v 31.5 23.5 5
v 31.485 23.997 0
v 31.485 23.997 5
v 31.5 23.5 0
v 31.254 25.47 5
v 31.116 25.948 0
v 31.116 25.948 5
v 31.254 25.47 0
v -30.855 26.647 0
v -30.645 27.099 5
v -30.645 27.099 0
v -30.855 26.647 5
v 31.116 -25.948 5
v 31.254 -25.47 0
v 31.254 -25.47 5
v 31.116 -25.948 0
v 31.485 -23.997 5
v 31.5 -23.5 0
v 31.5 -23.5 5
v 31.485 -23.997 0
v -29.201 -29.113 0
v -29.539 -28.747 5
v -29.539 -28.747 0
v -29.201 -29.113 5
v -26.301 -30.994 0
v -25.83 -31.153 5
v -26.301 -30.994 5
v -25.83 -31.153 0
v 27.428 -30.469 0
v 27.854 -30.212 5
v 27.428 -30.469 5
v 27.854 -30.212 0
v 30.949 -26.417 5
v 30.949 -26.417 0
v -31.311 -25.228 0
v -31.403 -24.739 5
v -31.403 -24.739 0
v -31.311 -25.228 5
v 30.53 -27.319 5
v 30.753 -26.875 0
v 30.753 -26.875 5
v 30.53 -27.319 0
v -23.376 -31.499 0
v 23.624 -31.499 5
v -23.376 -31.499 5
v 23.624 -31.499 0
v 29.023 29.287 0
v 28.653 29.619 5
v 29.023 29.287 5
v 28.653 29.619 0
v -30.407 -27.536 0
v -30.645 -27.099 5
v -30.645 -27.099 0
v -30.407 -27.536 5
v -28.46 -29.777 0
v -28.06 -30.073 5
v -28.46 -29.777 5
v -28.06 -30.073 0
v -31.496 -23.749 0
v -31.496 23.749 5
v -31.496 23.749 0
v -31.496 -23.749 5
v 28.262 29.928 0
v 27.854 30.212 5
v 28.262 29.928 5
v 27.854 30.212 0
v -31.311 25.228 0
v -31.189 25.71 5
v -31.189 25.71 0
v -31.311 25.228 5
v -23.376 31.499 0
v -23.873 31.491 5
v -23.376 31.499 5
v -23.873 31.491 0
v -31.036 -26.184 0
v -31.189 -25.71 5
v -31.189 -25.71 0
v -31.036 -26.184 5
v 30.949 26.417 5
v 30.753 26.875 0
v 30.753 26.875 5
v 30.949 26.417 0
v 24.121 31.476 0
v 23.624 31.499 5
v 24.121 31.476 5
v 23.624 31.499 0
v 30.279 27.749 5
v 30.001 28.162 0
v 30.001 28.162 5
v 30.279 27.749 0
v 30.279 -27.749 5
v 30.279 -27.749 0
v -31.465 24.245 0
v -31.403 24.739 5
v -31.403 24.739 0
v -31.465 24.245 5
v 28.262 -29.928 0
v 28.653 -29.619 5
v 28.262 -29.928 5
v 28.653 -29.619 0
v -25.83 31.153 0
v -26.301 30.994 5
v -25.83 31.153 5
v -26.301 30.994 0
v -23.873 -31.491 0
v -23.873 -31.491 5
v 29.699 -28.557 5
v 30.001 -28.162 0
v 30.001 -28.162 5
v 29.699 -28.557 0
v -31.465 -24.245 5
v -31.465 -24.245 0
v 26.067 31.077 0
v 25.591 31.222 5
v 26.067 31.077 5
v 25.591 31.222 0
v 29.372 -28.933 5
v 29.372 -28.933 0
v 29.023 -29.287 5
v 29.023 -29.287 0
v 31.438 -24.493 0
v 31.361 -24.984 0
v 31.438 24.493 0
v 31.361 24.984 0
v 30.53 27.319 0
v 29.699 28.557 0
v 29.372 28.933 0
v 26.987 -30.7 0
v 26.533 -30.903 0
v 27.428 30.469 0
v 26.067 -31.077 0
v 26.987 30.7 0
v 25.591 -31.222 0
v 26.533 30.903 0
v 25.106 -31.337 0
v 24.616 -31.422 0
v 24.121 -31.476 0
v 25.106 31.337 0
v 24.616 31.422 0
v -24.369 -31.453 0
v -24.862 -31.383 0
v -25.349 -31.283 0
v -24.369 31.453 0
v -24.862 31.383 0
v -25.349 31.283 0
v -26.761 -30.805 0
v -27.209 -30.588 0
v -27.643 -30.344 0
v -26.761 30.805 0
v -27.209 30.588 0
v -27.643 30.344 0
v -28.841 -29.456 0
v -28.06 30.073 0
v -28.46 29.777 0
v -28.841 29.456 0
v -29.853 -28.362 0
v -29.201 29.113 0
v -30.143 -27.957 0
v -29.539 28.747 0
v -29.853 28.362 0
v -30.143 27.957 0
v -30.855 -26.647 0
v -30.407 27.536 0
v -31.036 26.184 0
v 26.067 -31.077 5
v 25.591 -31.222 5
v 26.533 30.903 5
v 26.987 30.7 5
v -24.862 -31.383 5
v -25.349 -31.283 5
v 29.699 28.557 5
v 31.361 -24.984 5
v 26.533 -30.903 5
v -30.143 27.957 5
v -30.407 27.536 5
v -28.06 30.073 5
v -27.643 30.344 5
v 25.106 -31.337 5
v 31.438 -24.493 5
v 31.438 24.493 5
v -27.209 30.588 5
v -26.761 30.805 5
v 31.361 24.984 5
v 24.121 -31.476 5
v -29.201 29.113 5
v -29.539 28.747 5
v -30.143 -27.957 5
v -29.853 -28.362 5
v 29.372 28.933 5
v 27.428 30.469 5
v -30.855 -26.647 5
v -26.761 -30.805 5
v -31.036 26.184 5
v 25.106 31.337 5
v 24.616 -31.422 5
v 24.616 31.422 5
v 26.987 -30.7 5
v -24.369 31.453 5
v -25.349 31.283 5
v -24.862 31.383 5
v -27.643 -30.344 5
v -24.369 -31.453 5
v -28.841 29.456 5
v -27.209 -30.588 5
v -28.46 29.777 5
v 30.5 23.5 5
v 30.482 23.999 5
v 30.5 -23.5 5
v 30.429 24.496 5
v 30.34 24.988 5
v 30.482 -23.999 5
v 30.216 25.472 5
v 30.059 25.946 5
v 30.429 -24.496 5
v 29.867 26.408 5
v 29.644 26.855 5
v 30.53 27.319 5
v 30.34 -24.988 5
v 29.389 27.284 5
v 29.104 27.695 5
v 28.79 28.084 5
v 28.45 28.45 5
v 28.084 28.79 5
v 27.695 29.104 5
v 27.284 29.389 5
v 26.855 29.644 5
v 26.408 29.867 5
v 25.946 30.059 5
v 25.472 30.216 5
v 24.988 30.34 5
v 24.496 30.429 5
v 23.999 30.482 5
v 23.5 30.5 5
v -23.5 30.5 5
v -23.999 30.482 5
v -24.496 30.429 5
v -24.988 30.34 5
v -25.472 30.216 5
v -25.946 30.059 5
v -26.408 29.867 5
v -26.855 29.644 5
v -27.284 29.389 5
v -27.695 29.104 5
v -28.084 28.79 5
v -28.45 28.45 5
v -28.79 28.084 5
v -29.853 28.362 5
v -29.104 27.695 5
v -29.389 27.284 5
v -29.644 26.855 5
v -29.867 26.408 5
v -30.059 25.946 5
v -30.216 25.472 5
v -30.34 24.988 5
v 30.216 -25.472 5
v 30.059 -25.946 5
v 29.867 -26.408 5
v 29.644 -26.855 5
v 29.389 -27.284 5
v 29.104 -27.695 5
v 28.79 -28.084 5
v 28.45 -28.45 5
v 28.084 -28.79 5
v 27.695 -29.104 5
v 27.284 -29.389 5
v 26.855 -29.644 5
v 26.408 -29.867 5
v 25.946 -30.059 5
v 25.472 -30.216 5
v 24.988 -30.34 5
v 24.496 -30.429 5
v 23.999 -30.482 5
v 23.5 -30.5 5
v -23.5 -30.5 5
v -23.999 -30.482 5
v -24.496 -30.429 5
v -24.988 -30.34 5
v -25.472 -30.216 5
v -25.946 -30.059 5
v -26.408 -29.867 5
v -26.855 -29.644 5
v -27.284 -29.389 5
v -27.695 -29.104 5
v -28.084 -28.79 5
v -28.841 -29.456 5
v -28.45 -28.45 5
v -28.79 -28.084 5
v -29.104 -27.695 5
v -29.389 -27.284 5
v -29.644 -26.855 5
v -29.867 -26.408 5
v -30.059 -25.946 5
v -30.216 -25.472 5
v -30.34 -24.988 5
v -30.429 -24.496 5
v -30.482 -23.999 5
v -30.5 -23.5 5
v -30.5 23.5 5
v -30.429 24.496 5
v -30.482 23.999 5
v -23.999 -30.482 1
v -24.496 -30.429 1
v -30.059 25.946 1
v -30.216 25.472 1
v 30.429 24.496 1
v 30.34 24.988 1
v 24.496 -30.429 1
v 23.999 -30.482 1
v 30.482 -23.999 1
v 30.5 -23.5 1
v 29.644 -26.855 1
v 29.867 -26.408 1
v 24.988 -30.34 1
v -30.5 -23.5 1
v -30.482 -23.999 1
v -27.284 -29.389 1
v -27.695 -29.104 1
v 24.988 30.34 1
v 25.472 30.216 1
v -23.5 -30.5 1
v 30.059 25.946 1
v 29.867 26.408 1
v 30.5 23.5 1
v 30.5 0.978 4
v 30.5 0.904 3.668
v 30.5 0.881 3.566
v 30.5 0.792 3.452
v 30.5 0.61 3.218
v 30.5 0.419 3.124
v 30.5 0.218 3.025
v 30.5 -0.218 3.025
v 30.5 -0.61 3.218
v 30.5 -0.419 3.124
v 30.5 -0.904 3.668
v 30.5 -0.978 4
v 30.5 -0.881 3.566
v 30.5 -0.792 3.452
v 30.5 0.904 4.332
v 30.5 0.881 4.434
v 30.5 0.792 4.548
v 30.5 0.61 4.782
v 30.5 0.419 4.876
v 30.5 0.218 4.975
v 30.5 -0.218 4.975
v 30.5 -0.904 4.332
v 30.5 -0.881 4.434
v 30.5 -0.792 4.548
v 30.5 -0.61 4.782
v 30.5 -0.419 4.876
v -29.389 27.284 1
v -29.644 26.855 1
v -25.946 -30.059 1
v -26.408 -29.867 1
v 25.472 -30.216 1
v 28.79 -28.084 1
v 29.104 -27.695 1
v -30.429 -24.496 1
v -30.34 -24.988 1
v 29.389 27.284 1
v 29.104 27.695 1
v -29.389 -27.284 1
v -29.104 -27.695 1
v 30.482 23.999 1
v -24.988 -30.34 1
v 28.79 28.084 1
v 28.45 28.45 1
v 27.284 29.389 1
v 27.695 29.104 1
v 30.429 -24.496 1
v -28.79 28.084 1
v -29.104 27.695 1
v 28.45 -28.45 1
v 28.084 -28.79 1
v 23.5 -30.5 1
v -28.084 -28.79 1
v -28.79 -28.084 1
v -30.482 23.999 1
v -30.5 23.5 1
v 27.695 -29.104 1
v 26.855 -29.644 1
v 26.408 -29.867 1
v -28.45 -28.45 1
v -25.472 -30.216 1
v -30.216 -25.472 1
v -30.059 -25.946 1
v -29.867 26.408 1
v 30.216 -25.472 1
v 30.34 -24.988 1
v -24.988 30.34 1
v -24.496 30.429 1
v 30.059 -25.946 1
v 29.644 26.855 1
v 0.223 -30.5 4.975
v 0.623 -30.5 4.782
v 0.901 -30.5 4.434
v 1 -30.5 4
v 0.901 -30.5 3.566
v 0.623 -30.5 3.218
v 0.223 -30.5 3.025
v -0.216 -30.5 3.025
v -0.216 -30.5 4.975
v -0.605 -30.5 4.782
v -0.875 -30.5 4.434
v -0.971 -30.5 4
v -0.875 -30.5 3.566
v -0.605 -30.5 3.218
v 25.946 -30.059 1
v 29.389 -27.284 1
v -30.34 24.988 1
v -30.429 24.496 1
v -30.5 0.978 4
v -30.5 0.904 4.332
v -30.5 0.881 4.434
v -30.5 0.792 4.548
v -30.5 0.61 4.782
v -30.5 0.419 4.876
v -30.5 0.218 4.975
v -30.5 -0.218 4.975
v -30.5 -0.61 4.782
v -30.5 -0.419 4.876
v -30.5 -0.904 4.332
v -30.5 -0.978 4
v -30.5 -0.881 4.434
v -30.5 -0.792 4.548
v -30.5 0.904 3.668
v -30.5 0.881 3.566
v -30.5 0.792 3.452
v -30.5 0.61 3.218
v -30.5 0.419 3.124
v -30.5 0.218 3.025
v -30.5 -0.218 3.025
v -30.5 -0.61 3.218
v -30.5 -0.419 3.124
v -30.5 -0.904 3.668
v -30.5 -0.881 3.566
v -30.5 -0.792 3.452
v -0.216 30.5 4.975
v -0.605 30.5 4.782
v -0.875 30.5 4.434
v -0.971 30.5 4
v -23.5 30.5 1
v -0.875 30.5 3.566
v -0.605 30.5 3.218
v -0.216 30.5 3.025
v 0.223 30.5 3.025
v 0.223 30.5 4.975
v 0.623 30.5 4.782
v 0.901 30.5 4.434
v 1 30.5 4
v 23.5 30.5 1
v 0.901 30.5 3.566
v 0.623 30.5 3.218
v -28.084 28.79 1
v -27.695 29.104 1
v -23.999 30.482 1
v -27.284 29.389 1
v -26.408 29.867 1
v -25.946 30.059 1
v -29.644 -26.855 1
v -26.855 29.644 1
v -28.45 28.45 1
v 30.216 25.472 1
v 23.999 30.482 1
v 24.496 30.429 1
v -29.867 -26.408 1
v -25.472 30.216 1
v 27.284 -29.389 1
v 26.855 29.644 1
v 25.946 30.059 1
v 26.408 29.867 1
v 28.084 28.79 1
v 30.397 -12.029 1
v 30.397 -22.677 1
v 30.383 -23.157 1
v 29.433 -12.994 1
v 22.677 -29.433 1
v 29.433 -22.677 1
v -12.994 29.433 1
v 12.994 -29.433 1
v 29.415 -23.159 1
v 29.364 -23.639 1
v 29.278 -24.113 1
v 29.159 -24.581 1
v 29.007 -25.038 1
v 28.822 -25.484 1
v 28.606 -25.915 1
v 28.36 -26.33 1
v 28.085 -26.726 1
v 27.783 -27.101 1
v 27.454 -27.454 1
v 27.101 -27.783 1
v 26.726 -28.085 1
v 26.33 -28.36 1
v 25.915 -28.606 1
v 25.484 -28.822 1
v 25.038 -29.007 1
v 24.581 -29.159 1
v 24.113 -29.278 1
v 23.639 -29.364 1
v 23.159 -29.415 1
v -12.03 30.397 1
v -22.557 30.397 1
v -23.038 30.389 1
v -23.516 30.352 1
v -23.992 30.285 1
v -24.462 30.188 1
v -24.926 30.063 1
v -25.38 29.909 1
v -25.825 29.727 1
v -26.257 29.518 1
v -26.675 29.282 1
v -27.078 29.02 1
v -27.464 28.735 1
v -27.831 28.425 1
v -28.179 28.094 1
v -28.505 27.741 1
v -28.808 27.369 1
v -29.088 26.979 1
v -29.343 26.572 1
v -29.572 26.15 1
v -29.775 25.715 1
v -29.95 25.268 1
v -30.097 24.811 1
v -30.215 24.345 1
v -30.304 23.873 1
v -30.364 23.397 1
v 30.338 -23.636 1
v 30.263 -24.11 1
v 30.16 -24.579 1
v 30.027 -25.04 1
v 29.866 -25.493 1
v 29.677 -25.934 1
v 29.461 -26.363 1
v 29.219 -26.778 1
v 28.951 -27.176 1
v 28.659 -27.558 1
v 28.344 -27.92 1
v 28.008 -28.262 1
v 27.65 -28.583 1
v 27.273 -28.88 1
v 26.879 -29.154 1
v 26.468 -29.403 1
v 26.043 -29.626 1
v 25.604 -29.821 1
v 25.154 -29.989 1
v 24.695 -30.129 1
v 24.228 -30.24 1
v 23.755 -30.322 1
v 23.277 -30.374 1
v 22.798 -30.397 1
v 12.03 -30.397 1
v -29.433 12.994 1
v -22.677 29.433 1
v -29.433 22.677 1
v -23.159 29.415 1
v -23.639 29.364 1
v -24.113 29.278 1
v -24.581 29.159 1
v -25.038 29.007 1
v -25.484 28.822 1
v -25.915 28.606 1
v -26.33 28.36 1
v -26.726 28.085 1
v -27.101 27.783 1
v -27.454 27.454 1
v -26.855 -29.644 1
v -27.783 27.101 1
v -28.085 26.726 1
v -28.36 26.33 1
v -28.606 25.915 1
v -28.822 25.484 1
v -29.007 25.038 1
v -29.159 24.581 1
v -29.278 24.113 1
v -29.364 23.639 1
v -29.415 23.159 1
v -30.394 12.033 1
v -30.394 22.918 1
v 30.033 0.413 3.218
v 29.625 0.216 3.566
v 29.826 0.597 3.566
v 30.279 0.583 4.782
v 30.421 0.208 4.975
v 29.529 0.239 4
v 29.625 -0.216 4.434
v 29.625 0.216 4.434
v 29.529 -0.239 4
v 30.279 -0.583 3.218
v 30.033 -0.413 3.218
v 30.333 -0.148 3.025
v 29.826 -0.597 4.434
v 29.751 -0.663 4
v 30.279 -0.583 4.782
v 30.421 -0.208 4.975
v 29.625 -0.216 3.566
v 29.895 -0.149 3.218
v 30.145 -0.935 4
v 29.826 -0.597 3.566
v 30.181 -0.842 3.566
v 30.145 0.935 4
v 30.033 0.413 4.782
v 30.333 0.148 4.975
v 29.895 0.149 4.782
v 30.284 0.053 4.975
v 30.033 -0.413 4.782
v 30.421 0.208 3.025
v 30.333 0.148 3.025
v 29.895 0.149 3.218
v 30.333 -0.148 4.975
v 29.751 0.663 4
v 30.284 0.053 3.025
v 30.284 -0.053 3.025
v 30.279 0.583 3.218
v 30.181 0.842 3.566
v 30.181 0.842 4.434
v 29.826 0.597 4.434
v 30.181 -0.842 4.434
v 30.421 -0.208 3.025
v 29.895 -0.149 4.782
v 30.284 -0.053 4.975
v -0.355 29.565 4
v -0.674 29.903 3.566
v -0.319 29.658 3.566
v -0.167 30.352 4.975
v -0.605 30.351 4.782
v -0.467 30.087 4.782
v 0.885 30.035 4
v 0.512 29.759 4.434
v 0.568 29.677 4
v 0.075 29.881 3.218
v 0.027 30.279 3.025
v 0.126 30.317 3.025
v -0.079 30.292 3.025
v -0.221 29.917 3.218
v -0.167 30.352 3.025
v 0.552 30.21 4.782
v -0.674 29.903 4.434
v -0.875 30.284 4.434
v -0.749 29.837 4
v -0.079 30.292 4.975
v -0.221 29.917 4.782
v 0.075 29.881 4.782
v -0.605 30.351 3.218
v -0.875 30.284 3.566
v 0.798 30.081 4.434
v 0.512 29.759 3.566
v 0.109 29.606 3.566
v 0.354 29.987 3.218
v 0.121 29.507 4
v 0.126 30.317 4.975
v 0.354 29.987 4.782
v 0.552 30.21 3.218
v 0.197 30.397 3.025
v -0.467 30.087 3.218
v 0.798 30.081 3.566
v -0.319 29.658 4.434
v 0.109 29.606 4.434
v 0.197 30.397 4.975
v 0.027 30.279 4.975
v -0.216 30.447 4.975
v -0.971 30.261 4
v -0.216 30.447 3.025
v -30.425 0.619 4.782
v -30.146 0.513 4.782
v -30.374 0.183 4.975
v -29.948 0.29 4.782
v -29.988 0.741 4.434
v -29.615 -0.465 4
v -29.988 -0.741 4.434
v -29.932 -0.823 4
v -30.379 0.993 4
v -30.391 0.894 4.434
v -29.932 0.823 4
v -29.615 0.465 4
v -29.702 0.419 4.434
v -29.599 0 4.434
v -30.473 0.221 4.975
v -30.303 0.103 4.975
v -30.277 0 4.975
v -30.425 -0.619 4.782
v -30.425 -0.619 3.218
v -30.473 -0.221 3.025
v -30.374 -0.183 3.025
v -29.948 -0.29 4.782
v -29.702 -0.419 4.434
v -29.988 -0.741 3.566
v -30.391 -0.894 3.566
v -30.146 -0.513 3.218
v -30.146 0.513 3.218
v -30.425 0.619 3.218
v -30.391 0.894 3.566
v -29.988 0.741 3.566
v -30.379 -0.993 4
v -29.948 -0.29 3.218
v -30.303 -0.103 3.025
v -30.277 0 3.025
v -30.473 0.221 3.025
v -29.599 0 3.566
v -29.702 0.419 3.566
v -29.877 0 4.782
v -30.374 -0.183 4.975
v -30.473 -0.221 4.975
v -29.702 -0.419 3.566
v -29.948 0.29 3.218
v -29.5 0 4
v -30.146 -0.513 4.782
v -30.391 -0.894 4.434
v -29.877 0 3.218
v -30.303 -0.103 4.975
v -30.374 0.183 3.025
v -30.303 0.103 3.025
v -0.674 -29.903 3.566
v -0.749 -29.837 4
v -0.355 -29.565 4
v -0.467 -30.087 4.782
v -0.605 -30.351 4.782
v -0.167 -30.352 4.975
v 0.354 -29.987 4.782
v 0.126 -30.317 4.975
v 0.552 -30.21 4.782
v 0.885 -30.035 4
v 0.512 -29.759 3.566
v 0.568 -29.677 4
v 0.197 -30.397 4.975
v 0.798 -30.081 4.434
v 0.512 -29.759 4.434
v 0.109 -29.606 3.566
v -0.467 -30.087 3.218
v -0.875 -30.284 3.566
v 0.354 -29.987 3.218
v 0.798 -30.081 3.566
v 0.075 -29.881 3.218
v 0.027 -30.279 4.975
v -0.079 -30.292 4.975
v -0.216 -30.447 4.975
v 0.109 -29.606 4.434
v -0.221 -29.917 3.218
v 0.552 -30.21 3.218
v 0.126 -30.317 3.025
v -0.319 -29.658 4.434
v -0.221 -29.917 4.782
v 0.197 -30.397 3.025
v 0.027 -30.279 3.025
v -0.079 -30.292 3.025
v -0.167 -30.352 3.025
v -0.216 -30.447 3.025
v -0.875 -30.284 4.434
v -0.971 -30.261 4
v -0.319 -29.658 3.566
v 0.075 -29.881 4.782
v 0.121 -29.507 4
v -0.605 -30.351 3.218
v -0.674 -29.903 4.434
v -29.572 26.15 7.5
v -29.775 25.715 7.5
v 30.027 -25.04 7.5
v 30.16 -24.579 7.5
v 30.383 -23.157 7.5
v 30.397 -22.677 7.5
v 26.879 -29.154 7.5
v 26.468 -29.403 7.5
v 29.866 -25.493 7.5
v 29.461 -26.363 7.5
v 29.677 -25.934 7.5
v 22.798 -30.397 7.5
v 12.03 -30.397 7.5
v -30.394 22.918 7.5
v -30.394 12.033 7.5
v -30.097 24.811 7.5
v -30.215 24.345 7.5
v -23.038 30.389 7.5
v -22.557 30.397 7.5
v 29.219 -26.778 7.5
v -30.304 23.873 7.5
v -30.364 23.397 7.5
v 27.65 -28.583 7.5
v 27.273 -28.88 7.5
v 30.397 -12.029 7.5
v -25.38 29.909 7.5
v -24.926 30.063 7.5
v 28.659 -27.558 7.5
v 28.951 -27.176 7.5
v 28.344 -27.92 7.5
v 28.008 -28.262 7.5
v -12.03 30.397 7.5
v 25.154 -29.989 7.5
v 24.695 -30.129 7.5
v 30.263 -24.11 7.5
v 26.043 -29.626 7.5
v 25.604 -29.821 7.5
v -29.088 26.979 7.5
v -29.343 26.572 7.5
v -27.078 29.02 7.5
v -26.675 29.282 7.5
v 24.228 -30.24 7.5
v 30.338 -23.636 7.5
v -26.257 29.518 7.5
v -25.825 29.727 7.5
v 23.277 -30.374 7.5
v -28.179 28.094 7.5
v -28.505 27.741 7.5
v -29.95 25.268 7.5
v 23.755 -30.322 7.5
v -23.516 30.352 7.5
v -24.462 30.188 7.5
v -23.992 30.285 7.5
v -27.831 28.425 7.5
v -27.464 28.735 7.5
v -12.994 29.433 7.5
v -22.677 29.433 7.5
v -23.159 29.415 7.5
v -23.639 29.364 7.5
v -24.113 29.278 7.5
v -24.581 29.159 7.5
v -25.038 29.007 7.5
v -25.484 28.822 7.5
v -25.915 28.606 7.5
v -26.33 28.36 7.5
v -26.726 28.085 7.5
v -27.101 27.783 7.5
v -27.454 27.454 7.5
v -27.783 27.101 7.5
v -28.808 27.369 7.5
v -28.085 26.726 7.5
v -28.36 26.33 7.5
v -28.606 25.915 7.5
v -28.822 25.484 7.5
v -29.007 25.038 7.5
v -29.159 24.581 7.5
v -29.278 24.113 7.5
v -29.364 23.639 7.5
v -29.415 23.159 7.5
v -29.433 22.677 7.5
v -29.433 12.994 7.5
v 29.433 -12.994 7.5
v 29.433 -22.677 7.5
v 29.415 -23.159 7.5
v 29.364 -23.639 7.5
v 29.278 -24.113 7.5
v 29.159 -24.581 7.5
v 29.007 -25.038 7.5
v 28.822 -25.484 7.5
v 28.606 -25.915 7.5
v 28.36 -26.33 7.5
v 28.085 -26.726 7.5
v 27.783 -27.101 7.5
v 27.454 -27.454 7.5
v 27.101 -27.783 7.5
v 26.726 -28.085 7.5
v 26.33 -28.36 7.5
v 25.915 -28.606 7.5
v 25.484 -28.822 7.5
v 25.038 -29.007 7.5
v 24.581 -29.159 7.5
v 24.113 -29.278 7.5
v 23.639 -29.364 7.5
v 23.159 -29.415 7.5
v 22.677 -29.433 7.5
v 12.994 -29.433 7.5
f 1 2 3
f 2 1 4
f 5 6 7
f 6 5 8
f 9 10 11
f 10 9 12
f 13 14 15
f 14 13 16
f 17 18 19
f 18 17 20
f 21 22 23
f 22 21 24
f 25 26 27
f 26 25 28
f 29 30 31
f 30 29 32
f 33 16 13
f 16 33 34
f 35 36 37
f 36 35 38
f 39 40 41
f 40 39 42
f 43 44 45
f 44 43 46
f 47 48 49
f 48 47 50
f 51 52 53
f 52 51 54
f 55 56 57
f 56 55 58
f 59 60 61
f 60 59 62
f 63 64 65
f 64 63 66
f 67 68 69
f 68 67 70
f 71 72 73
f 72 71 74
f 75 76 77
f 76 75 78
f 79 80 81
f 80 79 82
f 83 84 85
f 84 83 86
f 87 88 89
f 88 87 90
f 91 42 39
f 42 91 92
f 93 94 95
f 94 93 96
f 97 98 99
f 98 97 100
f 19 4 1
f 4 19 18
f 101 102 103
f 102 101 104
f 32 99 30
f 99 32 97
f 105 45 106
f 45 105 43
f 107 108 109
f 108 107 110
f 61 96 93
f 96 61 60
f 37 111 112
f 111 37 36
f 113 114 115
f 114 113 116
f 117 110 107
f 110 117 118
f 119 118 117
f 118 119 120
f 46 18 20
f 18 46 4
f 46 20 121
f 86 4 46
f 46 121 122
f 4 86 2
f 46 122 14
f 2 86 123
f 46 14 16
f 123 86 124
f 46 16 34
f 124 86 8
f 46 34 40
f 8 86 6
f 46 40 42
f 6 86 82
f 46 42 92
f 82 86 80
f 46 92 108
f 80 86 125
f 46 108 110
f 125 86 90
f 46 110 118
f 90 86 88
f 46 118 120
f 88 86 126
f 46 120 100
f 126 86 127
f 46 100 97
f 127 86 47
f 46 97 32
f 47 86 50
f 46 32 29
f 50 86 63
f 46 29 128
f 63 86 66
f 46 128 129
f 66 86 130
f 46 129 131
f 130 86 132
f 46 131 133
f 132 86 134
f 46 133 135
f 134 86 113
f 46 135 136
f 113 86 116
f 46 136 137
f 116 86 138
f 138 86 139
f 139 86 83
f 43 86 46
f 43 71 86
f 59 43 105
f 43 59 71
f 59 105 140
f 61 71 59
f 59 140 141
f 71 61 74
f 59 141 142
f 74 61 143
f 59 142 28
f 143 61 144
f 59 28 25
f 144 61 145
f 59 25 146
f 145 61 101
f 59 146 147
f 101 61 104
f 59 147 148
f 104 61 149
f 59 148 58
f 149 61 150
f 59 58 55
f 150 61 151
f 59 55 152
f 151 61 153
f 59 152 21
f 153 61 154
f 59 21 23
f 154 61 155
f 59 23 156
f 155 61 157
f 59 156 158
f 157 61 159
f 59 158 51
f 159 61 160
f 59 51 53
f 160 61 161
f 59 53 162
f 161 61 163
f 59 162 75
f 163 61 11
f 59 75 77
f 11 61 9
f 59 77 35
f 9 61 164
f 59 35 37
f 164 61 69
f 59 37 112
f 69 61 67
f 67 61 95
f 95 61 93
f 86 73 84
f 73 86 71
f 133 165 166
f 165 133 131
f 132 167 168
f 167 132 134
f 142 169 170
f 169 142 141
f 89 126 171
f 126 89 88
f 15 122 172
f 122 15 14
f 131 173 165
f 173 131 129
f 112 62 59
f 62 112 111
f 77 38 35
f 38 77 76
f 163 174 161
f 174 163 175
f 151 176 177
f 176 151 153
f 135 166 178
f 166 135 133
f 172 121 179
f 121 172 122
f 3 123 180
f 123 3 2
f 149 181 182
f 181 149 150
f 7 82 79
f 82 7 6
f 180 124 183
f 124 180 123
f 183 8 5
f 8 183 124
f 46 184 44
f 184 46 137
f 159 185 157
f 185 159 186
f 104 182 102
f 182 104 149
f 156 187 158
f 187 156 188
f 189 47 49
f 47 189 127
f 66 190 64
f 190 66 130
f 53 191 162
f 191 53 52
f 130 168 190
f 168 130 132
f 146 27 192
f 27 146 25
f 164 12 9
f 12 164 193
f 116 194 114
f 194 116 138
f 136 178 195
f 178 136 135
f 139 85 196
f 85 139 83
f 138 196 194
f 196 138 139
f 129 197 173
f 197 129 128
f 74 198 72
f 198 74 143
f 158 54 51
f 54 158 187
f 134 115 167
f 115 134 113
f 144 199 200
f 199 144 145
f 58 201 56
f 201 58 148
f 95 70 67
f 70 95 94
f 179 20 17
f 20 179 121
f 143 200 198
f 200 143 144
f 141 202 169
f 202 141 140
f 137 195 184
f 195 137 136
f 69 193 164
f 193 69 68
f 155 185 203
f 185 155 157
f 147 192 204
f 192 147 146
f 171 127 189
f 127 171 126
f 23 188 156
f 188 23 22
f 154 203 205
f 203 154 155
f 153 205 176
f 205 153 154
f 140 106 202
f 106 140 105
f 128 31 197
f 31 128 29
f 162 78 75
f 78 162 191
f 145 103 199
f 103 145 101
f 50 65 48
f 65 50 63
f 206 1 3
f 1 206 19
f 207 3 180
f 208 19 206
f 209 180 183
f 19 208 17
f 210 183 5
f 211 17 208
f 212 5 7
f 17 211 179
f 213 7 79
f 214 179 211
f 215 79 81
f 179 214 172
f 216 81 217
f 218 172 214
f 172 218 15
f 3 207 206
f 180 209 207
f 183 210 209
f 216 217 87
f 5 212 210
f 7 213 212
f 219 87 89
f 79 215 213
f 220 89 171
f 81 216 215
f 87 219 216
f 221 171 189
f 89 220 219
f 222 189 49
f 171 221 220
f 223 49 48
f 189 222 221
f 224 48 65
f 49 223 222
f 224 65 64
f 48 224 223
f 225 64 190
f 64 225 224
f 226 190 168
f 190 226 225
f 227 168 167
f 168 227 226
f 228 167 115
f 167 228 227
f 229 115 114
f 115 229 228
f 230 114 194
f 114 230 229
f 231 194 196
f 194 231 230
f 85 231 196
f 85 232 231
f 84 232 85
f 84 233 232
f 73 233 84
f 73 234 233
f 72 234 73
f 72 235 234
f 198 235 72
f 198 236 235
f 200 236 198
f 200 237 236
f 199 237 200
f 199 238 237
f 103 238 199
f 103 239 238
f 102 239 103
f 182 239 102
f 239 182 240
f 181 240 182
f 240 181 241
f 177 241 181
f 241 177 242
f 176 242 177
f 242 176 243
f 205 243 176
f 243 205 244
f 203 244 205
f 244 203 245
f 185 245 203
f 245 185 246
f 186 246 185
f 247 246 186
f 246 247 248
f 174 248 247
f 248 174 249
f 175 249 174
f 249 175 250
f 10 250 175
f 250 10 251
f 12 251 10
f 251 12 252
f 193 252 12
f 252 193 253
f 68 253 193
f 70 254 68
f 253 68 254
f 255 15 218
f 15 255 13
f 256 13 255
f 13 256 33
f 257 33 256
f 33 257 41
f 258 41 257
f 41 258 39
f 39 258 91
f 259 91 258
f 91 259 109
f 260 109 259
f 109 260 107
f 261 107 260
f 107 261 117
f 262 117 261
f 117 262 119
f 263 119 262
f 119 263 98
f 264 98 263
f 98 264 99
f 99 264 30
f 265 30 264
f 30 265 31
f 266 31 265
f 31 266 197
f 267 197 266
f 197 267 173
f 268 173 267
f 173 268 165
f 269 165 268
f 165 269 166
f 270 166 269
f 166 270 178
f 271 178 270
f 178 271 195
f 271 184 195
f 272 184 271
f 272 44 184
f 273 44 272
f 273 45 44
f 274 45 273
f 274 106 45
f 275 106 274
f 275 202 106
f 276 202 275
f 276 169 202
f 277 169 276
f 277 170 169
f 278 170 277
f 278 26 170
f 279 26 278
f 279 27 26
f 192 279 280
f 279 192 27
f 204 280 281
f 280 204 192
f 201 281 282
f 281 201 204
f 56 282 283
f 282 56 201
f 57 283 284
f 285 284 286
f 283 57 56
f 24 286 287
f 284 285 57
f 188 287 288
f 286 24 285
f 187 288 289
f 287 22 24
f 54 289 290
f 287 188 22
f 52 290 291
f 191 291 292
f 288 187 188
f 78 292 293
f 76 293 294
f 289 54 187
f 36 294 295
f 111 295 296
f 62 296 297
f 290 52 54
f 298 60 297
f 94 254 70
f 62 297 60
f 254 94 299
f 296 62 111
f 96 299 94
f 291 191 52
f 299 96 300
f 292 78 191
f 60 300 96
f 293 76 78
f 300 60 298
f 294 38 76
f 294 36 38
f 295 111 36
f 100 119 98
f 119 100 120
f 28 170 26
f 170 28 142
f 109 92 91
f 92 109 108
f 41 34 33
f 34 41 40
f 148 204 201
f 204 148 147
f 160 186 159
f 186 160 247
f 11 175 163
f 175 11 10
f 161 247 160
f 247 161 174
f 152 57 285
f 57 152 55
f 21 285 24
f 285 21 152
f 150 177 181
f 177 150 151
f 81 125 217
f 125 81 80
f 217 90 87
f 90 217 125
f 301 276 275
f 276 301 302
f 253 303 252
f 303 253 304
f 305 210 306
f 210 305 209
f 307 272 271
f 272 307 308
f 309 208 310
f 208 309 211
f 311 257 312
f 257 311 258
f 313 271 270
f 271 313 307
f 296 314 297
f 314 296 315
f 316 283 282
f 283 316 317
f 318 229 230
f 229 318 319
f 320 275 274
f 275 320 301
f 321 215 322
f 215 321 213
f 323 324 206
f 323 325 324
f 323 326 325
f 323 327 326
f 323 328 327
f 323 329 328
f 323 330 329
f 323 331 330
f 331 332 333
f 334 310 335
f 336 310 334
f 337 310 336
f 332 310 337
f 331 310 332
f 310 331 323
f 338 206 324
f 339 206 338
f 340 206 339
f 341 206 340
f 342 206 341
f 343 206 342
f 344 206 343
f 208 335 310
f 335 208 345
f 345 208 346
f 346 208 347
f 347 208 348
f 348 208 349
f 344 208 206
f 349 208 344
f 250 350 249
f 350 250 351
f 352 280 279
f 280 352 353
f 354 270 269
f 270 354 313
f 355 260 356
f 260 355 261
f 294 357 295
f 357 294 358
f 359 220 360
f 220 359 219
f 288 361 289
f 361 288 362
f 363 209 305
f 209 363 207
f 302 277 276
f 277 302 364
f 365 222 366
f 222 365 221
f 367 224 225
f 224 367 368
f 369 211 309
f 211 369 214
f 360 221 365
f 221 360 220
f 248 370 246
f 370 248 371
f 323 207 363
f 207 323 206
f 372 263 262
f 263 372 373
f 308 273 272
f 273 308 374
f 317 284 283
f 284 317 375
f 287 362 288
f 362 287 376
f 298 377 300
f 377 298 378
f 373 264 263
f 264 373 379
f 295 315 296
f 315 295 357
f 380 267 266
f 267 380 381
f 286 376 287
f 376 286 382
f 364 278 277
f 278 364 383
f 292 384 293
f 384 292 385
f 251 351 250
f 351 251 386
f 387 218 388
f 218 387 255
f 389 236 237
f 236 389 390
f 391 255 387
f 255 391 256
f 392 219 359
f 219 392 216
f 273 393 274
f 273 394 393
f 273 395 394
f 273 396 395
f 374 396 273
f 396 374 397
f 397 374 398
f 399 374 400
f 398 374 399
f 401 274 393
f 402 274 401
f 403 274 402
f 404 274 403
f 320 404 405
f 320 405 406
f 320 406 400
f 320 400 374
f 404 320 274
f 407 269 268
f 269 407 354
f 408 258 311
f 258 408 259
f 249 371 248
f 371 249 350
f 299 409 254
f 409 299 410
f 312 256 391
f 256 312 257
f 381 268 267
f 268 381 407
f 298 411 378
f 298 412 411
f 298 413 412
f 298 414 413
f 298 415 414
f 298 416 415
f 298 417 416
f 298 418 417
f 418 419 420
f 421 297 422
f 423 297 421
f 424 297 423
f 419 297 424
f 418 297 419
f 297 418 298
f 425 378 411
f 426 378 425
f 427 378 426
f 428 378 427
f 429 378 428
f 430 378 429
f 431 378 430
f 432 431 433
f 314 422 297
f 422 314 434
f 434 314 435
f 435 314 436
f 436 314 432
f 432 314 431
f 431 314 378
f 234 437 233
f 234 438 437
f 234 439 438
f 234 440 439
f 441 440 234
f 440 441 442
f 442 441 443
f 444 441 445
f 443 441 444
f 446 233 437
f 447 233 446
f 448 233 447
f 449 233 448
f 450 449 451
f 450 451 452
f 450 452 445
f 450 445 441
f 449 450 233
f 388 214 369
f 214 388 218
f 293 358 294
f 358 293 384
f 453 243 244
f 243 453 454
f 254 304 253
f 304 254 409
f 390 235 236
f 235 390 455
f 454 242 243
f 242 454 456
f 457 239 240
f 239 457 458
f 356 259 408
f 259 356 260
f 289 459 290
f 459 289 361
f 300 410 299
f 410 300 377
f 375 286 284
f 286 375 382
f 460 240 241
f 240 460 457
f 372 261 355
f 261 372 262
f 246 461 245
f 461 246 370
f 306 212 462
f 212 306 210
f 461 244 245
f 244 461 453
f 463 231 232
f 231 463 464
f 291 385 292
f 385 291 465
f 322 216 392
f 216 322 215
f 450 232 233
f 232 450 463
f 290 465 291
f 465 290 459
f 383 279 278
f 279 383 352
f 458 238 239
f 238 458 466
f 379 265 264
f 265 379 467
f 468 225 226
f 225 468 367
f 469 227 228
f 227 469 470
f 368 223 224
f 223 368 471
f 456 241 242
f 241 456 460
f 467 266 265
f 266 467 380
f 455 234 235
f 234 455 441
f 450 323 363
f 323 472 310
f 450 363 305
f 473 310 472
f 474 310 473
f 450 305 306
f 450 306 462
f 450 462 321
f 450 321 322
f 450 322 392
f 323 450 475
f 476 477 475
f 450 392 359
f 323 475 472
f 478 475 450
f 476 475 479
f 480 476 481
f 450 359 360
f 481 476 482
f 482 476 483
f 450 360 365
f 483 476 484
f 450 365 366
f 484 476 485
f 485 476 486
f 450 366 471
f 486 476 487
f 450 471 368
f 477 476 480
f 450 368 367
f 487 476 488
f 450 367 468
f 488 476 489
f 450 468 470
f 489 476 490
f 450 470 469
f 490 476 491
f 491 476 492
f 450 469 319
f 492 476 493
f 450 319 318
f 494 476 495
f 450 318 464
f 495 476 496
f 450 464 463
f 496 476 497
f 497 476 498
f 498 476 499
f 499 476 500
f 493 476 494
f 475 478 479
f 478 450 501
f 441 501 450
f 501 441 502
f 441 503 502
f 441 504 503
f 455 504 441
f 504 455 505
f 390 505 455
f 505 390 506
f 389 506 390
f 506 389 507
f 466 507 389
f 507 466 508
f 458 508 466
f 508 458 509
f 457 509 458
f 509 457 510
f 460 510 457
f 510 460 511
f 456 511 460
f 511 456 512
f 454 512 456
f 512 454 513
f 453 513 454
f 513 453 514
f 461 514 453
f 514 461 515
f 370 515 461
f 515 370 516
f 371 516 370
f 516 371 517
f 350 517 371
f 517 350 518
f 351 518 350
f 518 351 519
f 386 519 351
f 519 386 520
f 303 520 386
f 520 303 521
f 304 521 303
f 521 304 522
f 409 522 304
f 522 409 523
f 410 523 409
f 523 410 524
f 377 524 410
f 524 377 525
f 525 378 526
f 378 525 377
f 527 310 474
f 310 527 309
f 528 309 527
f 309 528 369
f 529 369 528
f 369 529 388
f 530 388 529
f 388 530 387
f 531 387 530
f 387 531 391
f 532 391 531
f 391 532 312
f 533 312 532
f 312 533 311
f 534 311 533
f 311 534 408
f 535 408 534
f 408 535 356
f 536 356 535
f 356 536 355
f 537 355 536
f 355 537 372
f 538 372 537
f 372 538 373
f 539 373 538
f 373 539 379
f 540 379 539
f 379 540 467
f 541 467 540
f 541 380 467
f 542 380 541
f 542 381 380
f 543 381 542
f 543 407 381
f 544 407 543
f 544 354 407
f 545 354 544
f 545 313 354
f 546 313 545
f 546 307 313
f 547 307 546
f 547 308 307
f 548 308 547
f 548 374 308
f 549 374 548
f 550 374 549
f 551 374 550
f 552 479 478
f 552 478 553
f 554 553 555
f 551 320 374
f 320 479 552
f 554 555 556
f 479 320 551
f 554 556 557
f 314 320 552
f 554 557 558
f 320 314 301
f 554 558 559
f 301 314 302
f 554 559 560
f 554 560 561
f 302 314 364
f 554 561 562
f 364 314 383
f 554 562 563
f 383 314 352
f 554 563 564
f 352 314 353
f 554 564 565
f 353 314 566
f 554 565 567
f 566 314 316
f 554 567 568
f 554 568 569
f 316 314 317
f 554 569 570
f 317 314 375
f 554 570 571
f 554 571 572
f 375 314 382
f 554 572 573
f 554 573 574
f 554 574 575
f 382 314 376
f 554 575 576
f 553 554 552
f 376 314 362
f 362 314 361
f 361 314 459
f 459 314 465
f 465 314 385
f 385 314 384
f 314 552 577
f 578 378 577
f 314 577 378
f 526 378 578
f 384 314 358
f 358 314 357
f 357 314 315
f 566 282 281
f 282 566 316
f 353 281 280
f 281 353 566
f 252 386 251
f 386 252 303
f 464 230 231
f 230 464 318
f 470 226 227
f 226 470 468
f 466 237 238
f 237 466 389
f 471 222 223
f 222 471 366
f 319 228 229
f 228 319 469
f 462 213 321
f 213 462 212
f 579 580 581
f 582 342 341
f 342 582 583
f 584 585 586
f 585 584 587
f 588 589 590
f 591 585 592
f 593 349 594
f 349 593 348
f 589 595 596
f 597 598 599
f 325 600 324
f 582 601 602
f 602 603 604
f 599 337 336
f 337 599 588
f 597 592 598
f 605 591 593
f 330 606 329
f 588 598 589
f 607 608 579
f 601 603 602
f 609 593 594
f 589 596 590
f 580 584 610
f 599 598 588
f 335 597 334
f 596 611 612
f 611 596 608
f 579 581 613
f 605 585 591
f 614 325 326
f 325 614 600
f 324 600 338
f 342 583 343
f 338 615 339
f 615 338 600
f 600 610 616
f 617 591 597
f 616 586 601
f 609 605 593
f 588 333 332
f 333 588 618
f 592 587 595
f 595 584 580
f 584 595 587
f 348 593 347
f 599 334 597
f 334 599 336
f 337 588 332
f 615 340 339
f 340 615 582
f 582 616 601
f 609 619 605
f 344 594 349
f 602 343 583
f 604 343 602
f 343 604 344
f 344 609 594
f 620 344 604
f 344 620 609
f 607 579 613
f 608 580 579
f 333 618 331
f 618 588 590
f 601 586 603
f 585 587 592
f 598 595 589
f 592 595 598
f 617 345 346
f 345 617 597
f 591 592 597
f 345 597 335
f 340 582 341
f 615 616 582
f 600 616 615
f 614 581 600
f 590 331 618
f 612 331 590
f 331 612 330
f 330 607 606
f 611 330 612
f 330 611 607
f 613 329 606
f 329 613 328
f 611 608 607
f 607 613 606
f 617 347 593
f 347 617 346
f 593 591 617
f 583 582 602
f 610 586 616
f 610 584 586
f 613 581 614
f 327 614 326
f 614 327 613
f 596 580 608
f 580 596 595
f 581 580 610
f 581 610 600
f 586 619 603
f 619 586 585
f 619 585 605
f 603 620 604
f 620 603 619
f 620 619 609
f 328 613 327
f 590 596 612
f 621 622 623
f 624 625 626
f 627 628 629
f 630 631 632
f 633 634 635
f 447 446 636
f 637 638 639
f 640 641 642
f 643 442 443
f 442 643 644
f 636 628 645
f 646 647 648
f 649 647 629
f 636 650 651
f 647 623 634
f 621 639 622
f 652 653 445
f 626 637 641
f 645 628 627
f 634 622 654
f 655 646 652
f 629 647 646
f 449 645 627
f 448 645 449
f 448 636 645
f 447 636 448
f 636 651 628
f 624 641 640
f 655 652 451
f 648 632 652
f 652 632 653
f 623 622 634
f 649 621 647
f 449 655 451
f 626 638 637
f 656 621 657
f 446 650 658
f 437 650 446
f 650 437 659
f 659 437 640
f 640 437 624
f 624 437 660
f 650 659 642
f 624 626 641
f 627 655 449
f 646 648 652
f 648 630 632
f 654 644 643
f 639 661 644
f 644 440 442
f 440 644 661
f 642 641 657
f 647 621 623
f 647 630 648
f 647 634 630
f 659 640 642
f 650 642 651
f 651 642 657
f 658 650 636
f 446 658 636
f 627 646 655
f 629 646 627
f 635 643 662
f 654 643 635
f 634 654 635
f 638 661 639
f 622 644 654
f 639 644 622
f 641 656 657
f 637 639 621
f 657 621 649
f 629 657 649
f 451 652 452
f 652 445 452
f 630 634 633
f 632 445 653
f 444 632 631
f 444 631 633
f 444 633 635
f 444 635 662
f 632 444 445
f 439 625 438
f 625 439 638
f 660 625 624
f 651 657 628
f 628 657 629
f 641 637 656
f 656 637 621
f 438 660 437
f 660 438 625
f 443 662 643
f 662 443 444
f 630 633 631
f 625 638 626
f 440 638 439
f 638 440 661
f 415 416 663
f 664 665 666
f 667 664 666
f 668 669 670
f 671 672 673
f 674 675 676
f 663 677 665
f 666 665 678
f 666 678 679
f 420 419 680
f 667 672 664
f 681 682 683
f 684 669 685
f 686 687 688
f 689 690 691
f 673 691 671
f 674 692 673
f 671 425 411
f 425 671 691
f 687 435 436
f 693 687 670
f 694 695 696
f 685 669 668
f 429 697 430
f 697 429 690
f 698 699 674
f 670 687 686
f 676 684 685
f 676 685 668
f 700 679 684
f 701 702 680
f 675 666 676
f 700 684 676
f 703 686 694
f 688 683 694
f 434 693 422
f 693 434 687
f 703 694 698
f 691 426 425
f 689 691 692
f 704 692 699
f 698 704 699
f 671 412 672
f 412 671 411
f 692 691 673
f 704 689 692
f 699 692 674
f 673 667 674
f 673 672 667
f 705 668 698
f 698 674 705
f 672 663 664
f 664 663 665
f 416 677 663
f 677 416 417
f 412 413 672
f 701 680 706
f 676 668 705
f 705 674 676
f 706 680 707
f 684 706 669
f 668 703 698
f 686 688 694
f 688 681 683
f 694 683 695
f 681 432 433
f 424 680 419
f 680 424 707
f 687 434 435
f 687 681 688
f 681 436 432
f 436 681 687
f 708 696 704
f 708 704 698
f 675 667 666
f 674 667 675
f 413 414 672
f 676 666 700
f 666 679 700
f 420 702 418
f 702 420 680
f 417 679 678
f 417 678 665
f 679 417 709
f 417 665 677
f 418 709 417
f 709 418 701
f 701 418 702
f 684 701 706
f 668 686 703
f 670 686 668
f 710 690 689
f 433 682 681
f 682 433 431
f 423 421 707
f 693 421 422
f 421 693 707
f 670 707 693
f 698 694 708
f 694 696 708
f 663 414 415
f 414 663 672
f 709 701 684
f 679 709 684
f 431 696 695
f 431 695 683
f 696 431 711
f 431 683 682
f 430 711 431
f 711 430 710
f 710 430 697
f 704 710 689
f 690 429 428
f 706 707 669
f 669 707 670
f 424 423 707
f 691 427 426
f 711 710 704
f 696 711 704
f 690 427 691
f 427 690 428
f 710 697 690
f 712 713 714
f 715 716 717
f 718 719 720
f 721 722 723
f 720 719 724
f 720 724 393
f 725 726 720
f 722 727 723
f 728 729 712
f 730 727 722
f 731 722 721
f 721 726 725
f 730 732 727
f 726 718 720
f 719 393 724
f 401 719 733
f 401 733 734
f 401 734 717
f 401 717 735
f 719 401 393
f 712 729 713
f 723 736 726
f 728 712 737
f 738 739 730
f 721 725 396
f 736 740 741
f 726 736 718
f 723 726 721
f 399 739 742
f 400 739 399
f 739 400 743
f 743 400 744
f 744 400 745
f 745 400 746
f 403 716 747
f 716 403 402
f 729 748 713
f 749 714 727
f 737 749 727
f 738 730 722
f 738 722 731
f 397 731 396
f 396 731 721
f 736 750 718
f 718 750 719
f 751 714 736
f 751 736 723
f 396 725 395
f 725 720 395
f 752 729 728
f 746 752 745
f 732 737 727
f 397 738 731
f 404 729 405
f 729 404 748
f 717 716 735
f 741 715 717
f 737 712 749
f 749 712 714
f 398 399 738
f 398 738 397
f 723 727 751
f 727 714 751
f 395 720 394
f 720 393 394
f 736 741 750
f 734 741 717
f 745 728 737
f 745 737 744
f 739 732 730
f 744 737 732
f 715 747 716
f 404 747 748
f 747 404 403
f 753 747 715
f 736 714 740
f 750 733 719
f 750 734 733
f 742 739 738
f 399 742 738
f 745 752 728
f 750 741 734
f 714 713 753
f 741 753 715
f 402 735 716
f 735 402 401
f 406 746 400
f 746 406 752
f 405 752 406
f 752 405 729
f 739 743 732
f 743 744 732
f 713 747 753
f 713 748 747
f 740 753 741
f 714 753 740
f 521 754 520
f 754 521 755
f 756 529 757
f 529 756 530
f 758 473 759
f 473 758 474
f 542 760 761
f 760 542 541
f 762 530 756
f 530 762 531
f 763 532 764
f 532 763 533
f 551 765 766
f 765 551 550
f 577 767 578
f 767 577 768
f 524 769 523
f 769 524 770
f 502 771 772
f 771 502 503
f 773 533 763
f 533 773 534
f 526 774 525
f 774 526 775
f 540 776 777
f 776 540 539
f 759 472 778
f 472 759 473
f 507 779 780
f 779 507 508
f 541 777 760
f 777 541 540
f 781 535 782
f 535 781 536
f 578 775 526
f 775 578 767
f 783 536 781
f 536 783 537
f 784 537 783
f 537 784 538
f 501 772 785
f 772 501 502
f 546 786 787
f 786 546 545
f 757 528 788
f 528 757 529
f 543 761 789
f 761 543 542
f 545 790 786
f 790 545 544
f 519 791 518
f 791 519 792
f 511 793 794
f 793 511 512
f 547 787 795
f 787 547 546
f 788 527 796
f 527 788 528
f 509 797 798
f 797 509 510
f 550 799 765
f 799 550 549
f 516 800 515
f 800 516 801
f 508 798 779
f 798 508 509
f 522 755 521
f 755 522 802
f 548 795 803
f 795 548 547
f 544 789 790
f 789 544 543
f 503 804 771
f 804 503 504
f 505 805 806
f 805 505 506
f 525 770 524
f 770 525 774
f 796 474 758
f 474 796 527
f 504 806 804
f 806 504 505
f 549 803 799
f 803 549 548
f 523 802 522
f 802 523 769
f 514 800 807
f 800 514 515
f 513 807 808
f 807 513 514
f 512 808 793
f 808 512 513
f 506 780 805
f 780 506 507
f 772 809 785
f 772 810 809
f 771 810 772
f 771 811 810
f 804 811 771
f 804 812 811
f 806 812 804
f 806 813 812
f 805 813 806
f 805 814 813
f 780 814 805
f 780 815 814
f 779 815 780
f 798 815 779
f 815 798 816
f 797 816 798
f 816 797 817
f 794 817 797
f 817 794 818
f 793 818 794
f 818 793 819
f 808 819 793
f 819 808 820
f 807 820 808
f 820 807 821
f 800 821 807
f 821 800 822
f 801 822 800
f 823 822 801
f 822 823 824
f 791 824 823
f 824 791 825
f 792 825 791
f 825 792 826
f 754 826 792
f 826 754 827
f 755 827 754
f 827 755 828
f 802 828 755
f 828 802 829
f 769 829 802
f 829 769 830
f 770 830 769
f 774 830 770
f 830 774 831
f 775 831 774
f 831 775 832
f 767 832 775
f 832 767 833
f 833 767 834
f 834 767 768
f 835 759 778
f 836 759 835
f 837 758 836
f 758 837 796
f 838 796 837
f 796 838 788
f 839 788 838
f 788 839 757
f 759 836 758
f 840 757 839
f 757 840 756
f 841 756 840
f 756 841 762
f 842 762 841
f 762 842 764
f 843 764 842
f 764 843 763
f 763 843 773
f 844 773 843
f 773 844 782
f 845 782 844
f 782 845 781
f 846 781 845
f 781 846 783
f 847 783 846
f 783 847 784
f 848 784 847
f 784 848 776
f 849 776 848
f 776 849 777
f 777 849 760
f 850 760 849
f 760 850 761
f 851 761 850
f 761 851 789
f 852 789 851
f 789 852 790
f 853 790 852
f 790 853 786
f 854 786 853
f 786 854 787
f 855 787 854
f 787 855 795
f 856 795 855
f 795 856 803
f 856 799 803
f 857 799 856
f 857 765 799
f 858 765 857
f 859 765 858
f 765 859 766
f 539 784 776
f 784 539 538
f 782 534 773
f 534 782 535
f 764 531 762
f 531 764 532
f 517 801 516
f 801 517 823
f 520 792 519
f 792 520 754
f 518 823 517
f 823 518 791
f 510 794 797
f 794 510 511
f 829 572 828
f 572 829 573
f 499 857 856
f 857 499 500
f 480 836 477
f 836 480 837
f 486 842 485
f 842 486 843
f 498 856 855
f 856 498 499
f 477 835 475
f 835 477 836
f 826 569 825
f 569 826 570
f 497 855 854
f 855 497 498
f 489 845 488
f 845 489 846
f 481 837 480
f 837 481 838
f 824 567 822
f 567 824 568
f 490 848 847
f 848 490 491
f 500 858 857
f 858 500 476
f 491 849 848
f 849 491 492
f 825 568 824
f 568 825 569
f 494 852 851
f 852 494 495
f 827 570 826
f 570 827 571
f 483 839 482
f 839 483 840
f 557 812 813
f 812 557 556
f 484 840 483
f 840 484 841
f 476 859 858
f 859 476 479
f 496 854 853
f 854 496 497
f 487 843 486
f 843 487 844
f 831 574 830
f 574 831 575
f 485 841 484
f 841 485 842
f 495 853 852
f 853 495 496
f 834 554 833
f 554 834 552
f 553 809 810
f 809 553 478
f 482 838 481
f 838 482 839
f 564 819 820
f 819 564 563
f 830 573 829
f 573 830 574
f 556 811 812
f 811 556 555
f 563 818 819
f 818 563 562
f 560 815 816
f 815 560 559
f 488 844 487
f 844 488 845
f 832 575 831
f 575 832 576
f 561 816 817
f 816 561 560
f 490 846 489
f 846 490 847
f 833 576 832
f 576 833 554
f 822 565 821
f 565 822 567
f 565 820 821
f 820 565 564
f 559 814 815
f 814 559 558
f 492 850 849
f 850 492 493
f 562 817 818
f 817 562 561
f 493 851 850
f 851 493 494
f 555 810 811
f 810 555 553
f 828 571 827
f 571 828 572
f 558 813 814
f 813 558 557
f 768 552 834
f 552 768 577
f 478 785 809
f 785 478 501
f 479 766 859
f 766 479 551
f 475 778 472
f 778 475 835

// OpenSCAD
/*
    A box to hold a raw lens.
    The lens can be pressed into it and then is held
    down by the little spheres.
*/

/* Quality */
$fa = 3;   // minimum angle per fragment
$fs = 0.5;   // minimum size of fragment

test_print = false;    // Set to true to only create a fraction of the object

/* Parameters in mm */
lens_diameter    = 60;
tolerance        = 0.5;   // Gap on each side so the lens easily fits
wall_thickness   = 1;     // Walls of the box
bottom_thickness = 1;     // Bottom of the box
box_height       = 5;
sphere_diameter  = 1;   // Size of the spheres
sphere_pos_z     = 4;     // Vertical position of the spheres
corner_radius    = 8;     // Radius for the rounded corners of the square box

/* Calculations */

diameter_with_tolerance = lens_diameter + 2*tolerance;
outer_side = diameter_with_tolerance + 2*wall_thickness;
inner_side = diameter_with_tolerance;
inner_corner_radius = corner_radius - wall_thickness;

if (test_print)
    intersection() {
        lens_box();
        cube([lens_diameter+10,10,15],center=true);
    }
else
    lens_box();

// --------------------------------------------------
// Modules
// --------------------------------------------------

module lens_box() {
    color([0.6,0.6,0.6]) the_box();
    color([0.3,0.9,0.3]) the_spheres();
    color([0.2,0.4,0.9]) the_latches();
}

module the_box() {
    difference() {
        outer_box();
        storage_space();
    }
}

module the_latches() {
    difference() {
        inlay_walls();
        rotate(45) cube([90,60,20], center=true);
    }
}

module inlay_walls() {
    translate([0,0,0])
        scale([0.965, 0.965, 1.5])
            extra_walls();
}

module extra_walls() {
    difference() {
        outer_box();
        translate([0,0,-4]) scale([1,1,3]) storage_space();
    }
}

module outer_box() {
        // Outer box (square with rounded corners)
        linear_extrude(height=box_height) {
            minkowski() {
                square(outer_side - 2*corner_radius, center=true);
                circle(r=corner_radius);
            }
        }
}

module storage_space() {
        // Inner cavity for the lens
        translate([0,0,bottom_thickness])
        linear_extrude(height=box_height) {
            minkowski() {
                square(inner_side - 2*inner_corner_radius, center=true);
                circle(r=inner_corner_radius);
            }
        }
}

module the_spheres() {
    for (i = [0:3]) {
        angle = i*90;
        x = (diameter_with_tolerance/2) * cos(angle);
        y = (diameter_with_tolerance/2) * sin(angle);
        translate([x, y, sphere_pos_z])
                sphere(r=sphere_diameter);
    }
}
